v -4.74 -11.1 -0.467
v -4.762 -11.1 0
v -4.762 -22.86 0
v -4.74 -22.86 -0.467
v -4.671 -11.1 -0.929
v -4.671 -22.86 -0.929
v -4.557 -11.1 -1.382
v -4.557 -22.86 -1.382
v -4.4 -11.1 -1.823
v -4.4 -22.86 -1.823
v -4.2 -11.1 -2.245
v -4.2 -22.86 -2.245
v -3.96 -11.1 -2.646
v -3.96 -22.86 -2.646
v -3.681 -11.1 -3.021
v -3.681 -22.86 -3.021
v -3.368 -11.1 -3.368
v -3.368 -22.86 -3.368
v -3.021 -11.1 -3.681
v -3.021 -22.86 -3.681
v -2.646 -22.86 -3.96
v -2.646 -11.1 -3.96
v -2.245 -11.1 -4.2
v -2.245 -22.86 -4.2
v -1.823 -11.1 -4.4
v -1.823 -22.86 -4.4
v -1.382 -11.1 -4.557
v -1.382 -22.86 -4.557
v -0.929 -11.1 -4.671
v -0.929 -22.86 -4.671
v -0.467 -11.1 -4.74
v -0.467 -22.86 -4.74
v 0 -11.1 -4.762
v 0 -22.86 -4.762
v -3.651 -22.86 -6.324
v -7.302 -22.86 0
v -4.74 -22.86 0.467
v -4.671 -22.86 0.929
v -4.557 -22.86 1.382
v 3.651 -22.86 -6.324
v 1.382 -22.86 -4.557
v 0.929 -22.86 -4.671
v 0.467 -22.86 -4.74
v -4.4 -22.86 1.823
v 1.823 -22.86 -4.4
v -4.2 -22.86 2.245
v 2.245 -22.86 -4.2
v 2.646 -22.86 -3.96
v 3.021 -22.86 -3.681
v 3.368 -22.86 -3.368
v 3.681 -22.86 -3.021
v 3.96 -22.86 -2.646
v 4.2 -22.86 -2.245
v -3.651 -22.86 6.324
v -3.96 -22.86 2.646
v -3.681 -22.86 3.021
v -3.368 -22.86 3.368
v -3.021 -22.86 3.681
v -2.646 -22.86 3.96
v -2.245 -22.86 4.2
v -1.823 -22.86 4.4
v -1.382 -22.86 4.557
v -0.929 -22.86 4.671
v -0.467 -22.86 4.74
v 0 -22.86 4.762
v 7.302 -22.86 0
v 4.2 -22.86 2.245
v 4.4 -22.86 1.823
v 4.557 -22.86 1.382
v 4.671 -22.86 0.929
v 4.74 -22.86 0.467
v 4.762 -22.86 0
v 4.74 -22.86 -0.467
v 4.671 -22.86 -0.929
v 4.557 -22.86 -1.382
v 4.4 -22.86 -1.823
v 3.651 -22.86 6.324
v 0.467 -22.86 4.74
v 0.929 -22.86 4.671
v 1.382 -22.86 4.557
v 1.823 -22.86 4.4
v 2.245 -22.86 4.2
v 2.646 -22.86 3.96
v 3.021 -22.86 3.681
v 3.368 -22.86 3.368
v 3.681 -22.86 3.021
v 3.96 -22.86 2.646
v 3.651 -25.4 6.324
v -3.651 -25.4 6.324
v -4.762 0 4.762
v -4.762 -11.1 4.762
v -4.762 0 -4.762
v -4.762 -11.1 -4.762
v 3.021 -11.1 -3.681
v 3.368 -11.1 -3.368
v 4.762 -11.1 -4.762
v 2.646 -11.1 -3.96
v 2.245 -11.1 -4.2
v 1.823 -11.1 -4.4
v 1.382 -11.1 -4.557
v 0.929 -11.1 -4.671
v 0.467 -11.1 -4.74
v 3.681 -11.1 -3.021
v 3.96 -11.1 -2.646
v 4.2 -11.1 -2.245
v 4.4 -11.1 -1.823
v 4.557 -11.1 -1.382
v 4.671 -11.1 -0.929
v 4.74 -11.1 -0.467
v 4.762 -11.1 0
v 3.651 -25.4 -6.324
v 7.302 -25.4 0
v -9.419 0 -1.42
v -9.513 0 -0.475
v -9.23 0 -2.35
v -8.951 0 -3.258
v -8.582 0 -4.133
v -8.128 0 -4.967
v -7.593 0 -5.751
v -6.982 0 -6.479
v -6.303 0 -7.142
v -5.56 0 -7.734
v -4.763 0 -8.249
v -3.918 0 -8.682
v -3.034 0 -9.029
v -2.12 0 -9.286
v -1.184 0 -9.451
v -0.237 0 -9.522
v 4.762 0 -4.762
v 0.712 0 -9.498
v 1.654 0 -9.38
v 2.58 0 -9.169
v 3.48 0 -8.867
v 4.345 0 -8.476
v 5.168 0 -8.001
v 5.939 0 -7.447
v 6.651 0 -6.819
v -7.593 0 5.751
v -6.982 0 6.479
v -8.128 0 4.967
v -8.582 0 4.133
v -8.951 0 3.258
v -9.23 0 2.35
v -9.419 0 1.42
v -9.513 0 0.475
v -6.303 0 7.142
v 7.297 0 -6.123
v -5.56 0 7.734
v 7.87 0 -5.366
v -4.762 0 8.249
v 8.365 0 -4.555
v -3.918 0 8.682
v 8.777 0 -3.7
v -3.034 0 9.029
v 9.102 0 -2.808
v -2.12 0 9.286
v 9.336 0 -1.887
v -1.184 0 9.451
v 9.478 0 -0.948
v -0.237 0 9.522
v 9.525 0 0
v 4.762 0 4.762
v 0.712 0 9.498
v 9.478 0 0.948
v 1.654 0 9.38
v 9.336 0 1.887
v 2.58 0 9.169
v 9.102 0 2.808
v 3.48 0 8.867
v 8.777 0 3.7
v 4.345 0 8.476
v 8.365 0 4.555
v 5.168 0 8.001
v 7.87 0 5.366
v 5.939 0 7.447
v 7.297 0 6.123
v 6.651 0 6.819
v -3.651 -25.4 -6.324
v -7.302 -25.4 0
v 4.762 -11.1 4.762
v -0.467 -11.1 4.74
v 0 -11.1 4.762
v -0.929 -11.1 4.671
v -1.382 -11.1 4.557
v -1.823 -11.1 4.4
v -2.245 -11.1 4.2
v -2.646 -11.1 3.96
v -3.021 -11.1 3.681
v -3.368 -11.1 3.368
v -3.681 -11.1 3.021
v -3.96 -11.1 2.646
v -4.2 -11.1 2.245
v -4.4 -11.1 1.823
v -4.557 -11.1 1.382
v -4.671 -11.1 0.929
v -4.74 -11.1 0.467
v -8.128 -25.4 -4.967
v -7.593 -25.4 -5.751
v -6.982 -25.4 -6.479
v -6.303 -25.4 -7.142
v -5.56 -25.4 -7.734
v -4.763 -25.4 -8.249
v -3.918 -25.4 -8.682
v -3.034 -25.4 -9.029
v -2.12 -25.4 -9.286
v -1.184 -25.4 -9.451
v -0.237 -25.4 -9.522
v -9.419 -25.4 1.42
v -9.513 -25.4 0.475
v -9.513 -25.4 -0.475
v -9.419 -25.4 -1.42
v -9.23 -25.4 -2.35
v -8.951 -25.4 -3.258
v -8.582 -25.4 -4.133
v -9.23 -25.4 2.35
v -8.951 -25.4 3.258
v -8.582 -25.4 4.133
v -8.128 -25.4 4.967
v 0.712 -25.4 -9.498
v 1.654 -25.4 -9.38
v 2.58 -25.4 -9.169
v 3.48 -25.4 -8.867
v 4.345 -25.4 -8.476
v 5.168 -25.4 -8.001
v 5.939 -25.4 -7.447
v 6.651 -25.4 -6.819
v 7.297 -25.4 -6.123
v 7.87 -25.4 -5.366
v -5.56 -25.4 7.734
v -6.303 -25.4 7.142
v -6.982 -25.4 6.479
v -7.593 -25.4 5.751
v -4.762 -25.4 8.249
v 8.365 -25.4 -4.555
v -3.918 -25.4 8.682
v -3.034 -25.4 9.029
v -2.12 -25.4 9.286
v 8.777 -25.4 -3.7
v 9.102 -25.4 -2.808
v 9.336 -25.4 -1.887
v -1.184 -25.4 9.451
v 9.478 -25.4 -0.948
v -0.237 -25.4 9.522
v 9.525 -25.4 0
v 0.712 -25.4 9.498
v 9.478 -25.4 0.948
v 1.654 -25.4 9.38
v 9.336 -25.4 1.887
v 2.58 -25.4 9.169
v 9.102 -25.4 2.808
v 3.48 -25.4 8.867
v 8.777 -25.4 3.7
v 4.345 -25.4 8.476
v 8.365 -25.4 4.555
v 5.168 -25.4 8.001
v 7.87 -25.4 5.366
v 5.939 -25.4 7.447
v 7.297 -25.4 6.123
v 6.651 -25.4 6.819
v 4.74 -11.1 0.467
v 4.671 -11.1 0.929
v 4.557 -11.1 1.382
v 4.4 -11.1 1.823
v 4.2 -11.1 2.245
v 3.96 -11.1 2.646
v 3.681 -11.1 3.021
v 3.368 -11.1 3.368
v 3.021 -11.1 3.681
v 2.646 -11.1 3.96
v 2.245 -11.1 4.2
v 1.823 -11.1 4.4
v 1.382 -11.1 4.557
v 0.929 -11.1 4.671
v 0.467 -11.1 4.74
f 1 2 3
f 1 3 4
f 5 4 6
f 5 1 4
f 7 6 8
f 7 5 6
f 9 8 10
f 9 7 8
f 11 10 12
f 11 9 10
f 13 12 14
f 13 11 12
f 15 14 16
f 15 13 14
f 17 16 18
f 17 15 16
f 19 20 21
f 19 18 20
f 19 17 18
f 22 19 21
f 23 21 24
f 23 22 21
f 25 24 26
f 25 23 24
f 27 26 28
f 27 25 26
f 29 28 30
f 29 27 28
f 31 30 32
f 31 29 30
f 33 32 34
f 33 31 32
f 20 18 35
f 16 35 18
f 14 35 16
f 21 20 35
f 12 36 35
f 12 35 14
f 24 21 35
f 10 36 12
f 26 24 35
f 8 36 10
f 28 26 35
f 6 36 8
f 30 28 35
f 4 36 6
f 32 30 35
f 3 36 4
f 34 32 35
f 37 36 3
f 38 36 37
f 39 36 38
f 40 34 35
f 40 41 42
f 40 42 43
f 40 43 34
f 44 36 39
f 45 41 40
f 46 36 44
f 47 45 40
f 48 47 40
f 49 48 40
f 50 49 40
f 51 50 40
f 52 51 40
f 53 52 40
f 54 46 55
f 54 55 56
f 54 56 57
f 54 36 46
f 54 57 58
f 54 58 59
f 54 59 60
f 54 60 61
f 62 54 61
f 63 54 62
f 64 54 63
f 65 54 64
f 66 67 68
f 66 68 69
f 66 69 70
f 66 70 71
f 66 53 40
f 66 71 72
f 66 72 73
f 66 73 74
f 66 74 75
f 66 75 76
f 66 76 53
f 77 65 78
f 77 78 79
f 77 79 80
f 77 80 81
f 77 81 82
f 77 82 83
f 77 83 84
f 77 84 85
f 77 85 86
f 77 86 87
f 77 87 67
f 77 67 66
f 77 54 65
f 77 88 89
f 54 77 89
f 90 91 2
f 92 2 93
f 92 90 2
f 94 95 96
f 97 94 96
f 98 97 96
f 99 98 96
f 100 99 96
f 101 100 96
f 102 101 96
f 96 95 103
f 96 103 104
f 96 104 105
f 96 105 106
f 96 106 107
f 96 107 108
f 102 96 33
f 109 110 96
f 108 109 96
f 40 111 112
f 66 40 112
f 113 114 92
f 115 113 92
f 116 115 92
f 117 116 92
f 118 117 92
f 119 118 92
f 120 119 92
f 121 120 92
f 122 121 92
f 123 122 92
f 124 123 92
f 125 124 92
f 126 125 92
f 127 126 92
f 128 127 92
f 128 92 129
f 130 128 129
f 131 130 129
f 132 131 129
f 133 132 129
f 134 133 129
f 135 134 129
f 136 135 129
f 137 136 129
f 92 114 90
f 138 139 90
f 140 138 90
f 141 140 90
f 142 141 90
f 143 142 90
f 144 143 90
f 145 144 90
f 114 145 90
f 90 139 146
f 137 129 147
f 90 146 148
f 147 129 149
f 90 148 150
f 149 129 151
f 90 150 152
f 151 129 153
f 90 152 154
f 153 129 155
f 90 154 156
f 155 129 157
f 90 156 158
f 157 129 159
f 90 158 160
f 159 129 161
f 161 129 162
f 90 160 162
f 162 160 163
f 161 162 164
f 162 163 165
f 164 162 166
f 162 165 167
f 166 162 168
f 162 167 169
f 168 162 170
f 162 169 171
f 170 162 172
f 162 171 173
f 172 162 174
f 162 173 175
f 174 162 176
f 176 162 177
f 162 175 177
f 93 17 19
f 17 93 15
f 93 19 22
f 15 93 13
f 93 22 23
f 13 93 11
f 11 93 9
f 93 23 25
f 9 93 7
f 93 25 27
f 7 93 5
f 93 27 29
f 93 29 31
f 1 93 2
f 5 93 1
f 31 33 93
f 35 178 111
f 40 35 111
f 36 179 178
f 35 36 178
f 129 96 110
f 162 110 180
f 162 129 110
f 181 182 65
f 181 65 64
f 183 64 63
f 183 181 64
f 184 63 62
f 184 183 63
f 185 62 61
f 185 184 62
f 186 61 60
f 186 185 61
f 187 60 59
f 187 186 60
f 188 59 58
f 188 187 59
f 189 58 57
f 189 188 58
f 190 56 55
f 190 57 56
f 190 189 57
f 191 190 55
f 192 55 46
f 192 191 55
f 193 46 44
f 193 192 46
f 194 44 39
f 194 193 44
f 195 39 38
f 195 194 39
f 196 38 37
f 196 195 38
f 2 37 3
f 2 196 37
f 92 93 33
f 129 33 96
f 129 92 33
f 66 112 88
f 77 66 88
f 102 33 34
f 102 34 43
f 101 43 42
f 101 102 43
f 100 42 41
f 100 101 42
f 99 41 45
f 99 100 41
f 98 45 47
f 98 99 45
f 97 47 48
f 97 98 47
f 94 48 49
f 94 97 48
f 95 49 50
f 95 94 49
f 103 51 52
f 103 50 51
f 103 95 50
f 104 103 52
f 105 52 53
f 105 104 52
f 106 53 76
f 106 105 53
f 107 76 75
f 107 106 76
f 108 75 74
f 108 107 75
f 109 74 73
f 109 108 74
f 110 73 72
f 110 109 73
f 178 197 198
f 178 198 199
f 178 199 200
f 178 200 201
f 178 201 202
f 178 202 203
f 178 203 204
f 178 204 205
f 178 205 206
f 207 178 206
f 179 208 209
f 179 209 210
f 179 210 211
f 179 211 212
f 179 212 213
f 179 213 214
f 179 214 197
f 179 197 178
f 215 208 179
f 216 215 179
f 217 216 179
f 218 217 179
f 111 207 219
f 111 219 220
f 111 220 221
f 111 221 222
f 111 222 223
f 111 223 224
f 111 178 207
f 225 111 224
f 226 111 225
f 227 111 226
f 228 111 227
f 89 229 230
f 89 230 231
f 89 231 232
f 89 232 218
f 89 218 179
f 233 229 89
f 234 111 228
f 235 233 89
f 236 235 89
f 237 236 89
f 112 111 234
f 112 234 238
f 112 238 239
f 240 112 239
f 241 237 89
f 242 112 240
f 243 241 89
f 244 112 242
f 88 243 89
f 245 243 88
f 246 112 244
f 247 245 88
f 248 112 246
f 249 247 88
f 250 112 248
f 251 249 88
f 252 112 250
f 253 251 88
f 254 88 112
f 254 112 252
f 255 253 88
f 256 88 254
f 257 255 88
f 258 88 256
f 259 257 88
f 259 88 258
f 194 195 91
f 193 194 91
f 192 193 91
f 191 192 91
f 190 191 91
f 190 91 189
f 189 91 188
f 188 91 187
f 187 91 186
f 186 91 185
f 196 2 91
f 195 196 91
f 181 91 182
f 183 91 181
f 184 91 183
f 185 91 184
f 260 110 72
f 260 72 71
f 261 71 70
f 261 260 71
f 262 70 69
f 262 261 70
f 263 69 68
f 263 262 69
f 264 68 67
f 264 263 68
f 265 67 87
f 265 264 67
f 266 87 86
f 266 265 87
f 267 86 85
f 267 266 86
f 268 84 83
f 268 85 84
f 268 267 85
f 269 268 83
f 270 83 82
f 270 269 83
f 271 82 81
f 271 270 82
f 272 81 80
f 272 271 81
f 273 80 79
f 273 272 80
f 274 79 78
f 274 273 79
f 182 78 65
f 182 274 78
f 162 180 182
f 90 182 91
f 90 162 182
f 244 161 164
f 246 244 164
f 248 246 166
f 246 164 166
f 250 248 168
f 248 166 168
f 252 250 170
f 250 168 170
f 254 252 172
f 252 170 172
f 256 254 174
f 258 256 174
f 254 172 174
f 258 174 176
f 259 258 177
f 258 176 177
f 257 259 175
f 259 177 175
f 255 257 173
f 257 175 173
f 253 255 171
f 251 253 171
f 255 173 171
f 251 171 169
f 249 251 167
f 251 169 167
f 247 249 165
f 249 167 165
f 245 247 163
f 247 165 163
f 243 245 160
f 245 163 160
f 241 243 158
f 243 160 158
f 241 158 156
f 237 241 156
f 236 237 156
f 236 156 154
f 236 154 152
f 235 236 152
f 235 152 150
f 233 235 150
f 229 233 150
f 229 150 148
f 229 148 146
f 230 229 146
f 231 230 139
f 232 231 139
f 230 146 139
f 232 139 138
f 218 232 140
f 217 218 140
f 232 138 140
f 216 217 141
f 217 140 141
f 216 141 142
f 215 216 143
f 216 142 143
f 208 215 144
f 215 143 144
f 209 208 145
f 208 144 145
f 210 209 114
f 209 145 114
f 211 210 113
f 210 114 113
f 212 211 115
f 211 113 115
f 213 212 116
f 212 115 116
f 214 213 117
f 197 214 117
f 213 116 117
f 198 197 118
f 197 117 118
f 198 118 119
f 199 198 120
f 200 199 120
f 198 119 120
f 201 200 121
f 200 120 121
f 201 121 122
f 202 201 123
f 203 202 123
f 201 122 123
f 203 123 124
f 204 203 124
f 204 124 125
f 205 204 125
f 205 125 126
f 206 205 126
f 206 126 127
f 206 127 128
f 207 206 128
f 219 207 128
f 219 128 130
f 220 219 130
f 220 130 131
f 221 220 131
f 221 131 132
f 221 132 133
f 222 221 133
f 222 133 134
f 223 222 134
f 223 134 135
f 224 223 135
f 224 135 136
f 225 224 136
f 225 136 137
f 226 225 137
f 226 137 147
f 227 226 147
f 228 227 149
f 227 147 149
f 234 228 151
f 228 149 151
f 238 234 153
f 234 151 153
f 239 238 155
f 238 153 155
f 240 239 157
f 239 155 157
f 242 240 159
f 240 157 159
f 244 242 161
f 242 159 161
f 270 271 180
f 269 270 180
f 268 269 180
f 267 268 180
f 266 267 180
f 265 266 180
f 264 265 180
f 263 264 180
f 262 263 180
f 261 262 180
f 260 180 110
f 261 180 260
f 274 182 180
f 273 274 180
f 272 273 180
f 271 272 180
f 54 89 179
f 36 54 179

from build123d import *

# Parameters (mm, degrees)
F0_R     = 9.525
F1_DEPTH = 25.4
F3_DEPTH = 25.4
F4_DEPTH = 11.0998
F6_DEPTH = 2.54


with BuildPart() as f1:
    # F0 (on Front) → F1 (new body)
    with BuildSketch(Plane.XZ):
        Circle(F0_R)
    extrude(amount=F1_DEPTH)

    # F2 (on Front) → F3 (cut)
    with BuildSketch(Plane.XZ):
        with BuildLine():
            ThreePointArc((-4.7625, 0), (-3.367596, -3.367596), (0, -4.7625))
            ThreePointArc((0, -4.7625), (3.367596, -3.367596), (4.7625, 0))
            ThreePointArc((4.7625, 0), (3.367596, 3.367596), (0, 4.7625))
            ThreePointArc((0, 4.7625), (-3.367596, 3.367596), (-4.7625, 0))
        make_face()
    extrude(amount=F3_DEPTH, mode=Mode.SUBTRACT)

    # F2 (on Front) → F4 (cut)
    with BuildSketch(Plane.XZ):
        with BuildLine():
            Line((-4.7625, 0), (-4.7625, -4.7625))
            Line((-4.7625, -4.7625), (0, -4.7625))
            ThreePointArc((0, -4.7625), (-3.367596, -3.367596), (-4.7625, 0))
        make_face()
        with BuildLine():
            ThreePointArc((4.7625, 0), (3.367596, -3.367596), (0, -4.7625))
            Line((0, -4.7625), (4.7625, -4.7625))
            Line((4.7625, -4.7625), (4.7625, 0))
        make_face()
        with BuildLine():
            Line((-4.7625, 4.7625), (-4.7625, 0))
            ThreePointArc((-4.7625, 0), (-3.367596, 3.367596), (0, 4.7625))
            Line((0, 4.7625), (-4.7625, 4.7625))
        make_face()
        with BuildLine():
            ThreePointArc((0, 4.7625), (3.367596, 3.367596), (4.7625, 0))
            Line((4.7625, 0), (4.7625, 4.7625))
            Line((4.7625, 4.7625), (0, 4.7625))
        make_face()
    extrude(amount=F4_DEPTH, mode=Mode.SUBTRACT)

    # F5 (on face) → F6 (cut)
    with BuildSketch(Plane.XZ.offset(25.4)):
        Polygon((7.3025, 0), (3.65125, 6.324151), (-3.65125, 6.324151), (-7.3025, 0), (-3.65125, -6.324151), (3.65125, -6.324151), align=None)
    extrude(amount=-F6_DEPTH, mode=Mode.SUBTRACT)


solid = f1.part
